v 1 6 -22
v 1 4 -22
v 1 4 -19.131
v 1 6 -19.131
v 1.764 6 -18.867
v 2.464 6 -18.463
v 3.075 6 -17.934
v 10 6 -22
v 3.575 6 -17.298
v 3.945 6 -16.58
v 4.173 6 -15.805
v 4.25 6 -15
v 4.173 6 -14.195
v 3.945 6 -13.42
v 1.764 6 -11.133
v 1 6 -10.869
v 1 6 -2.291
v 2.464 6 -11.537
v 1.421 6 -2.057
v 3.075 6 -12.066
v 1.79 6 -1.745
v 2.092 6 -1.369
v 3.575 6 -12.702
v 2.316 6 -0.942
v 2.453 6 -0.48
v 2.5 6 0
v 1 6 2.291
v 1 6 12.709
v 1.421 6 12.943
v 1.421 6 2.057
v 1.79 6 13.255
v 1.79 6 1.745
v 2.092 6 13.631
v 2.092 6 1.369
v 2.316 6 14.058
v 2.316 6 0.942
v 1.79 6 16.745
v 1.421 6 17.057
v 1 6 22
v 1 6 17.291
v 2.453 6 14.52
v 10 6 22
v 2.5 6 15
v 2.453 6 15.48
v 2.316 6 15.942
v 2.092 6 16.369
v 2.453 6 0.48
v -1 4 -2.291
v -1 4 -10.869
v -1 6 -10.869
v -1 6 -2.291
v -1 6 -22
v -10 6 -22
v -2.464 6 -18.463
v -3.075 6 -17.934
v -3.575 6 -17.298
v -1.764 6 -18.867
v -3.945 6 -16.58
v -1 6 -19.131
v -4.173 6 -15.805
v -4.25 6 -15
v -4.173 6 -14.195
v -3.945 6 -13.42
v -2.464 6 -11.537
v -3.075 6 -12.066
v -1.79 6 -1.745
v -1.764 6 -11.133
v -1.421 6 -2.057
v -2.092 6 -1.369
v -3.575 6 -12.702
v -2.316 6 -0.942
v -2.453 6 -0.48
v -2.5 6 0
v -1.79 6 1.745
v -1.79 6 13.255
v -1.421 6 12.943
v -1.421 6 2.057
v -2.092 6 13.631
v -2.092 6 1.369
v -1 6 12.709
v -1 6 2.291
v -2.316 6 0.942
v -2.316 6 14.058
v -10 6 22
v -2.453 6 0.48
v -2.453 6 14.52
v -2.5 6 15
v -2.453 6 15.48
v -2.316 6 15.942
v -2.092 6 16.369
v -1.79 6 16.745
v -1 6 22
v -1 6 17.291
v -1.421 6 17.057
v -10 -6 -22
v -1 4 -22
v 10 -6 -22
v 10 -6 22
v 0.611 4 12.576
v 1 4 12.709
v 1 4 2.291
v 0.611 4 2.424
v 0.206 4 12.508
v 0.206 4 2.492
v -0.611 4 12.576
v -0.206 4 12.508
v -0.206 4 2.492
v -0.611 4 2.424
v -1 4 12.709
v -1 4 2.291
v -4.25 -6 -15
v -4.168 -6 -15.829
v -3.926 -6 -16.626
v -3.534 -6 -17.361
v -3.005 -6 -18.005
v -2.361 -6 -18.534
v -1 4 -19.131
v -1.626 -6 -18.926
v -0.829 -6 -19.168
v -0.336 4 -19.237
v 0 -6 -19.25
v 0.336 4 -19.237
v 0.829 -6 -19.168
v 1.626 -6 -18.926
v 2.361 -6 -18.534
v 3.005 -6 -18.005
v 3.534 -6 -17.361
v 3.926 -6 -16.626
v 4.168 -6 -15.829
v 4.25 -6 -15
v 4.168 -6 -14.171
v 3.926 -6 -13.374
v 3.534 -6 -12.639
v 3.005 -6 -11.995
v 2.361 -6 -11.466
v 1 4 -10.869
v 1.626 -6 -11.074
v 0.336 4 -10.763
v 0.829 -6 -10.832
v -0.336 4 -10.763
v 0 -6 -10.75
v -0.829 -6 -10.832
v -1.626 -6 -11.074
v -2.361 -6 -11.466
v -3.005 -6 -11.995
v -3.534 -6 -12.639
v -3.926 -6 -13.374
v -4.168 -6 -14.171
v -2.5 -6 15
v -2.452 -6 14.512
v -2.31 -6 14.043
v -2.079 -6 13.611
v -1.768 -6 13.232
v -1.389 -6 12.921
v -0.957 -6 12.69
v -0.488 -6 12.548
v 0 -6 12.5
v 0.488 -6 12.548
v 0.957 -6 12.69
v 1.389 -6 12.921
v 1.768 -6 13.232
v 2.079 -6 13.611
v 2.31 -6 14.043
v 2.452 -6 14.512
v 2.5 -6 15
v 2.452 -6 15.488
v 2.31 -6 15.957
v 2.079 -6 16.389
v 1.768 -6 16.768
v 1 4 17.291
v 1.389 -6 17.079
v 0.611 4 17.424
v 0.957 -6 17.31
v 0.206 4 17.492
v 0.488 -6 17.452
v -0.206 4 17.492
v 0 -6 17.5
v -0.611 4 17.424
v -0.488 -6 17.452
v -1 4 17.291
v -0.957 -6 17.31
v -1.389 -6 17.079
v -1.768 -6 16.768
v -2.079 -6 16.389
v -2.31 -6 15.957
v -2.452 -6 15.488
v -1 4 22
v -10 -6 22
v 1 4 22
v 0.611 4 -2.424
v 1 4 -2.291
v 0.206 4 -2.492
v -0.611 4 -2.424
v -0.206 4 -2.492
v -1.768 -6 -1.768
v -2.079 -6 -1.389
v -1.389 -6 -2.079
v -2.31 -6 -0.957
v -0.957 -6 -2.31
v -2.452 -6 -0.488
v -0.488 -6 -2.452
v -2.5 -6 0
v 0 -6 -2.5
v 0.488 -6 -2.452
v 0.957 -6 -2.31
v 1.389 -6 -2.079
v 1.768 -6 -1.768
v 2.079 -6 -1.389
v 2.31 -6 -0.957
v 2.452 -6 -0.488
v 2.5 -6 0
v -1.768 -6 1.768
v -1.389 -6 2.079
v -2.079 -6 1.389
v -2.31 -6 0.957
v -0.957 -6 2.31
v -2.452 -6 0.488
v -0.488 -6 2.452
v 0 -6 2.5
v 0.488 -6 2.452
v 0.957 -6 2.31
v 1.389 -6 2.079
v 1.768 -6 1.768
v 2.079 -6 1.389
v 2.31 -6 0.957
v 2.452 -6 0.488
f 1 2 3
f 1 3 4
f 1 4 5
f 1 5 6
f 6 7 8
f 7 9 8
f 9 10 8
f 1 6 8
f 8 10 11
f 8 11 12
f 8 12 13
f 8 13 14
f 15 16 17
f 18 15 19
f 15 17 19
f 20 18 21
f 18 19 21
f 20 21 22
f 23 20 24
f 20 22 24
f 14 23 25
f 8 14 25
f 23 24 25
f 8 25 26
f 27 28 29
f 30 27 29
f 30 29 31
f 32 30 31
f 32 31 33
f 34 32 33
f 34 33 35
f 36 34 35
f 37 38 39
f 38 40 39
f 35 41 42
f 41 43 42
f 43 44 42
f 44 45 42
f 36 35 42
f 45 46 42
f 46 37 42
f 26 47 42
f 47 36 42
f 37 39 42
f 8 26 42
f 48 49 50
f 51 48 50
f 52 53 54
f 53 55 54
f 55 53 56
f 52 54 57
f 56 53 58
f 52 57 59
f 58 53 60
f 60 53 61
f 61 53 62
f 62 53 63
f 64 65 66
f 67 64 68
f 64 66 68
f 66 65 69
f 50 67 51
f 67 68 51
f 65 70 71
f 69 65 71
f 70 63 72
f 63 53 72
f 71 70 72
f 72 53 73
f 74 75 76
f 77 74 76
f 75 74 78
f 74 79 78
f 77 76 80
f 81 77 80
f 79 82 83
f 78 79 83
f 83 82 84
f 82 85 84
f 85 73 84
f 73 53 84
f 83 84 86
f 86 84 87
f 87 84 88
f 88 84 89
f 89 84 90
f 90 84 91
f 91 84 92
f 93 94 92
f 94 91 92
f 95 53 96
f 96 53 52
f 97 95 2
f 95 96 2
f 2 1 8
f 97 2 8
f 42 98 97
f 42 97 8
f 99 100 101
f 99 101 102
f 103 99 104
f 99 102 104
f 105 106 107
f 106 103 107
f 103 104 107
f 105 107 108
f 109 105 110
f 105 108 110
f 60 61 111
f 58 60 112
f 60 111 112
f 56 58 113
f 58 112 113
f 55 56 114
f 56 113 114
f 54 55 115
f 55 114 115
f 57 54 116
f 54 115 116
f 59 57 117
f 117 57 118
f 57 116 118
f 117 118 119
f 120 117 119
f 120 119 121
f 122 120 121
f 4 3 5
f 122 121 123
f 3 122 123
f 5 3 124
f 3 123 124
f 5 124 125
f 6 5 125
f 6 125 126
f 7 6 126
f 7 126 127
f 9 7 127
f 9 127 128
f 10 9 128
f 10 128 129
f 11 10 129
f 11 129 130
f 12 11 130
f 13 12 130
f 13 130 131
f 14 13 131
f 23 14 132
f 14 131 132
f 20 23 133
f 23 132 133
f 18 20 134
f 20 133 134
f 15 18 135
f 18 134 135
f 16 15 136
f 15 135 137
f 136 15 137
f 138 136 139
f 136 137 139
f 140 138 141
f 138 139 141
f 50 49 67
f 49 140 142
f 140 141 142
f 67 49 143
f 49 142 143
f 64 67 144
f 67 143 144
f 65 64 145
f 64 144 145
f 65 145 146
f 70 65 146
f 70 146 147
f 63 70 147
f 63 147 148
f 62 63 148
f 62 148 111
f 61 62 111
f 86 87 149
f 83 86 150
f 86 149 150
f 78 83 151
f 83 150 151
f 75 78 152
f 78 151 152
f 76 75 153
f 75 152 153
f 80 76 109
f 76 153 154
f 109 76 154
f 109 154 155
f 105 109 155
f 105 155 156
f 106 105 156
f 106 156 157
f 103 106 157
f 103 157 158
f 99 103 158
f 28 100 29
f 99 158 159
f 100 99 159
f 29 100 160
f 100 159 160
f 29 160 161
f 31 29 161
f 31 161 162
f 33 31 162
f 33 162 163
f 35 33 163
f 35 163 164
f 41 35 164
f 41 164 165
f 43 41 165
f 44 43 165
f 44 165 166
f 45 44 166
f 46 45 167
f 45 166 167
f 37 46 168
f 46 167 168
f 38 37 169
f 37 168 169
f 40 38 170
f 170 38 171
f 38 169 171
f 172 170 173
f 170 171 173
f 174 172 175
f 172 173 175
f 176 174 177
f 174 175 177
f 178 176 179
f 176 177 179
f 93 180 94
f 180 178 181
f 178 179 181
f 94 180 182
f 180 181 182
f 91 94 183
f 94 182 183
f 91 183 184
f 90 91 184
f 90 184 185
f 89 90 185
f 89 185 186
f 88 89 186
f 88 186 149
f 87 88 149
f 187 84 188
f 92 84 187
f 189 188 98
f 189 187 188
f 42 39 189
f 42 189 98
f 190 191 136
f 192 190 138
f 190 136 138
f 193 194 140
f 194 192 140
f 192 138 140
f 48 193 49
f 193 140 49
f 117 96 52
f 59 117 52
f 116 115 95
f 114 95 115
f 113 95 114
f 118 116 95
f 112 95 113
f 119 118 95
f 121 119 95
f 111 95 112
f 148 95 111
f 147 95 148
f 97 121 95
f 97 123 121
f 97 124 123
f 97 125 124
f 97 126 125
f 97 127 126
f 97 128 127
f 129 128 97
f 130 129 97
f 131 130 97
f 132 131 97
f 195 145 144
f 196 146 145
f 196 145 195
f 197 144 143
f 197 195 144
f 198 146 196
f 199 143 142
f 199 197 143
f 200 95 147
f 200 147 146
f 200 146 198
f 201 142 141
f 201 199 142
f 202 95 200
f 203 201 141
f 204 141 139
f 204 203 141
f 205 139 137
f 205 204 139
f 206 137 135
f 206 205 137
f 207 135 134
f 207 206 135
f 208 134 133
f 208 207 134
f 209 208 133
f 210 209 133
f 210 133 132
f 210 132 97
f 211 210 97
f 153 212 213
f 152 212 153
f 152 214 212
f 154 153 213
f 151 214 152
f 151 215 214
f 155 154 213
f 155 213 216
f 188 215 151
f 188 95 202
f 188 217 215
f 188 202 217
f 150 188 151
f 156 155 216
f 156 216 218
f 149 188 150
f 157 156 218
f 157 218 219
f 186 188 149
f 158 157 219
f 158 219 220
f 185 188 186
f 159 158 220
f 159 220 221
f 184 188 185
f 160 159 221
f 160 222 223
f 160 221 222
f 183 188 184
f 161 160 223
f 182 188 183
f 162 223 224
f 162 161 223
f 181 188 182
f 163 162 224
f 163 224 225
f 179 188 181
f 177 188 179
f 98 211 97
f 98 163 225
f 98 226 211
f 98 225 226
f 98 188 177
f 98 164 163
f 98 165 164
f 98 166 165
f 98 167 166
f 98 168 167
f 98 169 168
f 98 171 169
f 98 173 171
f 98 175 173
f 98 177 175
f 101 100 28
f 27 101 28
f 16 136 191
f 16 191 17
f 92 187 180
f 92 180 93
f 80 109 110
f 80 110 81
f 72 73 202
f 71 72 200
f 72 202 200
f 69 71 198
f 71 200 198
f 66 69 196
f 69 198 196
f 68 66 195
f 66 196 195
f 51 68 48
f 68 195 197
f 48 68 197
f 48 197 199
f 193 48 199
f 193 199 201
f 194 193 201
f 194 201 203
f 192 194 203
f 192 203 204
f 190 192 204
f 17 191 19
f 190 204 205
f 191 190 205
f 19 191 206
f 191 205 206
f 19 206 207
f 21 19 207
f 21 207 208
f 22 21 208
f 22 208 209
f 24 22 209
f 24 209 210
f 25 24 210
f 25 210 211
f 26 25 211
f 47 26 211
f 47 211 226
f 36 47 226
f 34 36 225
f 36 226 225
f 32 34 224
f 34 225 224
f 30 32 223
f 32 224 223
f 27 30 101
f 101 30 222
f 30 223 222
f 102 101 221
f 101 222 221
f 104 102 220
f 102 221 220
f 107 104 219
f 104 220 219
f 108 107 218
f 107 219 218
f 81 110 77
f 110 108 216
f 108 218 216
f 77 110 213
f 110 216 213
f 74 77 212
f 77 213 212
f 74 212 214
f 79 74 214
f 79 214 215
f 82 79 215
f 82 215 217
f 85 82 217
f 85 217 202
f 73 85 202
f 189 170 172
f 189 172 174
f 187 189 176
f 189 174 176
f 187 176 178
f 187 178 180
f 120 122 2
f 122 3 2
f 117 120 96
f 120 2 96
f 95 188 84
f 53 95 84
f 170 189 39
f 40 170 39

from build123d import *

# Parameters (mm, degrees)
SKETCH1_W              = 20
SKETCH1_H              = 12
BOSS_EXTRUDE1_DEPTH    = 22
M6X1_0_TAPPED_HOLE1_D  = 5
SKETCH7_W              = 2
SKETCH7_H              = 2
CUT_EXTRUDE2_DEPTH     = 46.519226707
M10X1_5_TAPPED_HOLE1_D = 8.5


with BuildPart() as part:
    # Sketch1 → Boss-Extrude1 (new, symmetric)
    with BuildSketch(Plane.XY):
        Rectangle(SKETCH1_W, SKETCH1_H)
    extrude(amount=BOSS_EXTRUDE1_DEPTH, both=True)

    # M6x1.0 Tapped Hole1 (through all)
    with Locations(Plane(origin=(0, 6, 0), x_dir=(1, 0, 0), z_dir=(0, 1, 0))):
        with Locations((0, -15), (0, 0), (0, 15)):
            Hole(M6X1_0_TAPPED_HOLE1_D / 2)

    # Sketch7 → Cut-Extrude2 (cut, through all)
    with BuildSketch(Plane(origin=(0, 0, -22), x_dir=(-1, 0, 0), z_dir=(0, 0, -1))):
        with Locations((0, 5)):
            Rectangle(SKETCH7_W, SKETCH7_H)
    extrude(amount=-CUT_EXTRUDE2_DEPTH, mode=Mode.SUBTRACT)

    # M10x1.5 Tapped Hole1 (through all)
    with Locations(Plane(origin=(0, 6, 0), x_dir=(1, 0, 0), z_dir=(0, 1, 0))):
        with Locations((0, 15)):
            Hole(M10X1_5_TAPPED_HOLE1_D / 2)


solid = part.part
